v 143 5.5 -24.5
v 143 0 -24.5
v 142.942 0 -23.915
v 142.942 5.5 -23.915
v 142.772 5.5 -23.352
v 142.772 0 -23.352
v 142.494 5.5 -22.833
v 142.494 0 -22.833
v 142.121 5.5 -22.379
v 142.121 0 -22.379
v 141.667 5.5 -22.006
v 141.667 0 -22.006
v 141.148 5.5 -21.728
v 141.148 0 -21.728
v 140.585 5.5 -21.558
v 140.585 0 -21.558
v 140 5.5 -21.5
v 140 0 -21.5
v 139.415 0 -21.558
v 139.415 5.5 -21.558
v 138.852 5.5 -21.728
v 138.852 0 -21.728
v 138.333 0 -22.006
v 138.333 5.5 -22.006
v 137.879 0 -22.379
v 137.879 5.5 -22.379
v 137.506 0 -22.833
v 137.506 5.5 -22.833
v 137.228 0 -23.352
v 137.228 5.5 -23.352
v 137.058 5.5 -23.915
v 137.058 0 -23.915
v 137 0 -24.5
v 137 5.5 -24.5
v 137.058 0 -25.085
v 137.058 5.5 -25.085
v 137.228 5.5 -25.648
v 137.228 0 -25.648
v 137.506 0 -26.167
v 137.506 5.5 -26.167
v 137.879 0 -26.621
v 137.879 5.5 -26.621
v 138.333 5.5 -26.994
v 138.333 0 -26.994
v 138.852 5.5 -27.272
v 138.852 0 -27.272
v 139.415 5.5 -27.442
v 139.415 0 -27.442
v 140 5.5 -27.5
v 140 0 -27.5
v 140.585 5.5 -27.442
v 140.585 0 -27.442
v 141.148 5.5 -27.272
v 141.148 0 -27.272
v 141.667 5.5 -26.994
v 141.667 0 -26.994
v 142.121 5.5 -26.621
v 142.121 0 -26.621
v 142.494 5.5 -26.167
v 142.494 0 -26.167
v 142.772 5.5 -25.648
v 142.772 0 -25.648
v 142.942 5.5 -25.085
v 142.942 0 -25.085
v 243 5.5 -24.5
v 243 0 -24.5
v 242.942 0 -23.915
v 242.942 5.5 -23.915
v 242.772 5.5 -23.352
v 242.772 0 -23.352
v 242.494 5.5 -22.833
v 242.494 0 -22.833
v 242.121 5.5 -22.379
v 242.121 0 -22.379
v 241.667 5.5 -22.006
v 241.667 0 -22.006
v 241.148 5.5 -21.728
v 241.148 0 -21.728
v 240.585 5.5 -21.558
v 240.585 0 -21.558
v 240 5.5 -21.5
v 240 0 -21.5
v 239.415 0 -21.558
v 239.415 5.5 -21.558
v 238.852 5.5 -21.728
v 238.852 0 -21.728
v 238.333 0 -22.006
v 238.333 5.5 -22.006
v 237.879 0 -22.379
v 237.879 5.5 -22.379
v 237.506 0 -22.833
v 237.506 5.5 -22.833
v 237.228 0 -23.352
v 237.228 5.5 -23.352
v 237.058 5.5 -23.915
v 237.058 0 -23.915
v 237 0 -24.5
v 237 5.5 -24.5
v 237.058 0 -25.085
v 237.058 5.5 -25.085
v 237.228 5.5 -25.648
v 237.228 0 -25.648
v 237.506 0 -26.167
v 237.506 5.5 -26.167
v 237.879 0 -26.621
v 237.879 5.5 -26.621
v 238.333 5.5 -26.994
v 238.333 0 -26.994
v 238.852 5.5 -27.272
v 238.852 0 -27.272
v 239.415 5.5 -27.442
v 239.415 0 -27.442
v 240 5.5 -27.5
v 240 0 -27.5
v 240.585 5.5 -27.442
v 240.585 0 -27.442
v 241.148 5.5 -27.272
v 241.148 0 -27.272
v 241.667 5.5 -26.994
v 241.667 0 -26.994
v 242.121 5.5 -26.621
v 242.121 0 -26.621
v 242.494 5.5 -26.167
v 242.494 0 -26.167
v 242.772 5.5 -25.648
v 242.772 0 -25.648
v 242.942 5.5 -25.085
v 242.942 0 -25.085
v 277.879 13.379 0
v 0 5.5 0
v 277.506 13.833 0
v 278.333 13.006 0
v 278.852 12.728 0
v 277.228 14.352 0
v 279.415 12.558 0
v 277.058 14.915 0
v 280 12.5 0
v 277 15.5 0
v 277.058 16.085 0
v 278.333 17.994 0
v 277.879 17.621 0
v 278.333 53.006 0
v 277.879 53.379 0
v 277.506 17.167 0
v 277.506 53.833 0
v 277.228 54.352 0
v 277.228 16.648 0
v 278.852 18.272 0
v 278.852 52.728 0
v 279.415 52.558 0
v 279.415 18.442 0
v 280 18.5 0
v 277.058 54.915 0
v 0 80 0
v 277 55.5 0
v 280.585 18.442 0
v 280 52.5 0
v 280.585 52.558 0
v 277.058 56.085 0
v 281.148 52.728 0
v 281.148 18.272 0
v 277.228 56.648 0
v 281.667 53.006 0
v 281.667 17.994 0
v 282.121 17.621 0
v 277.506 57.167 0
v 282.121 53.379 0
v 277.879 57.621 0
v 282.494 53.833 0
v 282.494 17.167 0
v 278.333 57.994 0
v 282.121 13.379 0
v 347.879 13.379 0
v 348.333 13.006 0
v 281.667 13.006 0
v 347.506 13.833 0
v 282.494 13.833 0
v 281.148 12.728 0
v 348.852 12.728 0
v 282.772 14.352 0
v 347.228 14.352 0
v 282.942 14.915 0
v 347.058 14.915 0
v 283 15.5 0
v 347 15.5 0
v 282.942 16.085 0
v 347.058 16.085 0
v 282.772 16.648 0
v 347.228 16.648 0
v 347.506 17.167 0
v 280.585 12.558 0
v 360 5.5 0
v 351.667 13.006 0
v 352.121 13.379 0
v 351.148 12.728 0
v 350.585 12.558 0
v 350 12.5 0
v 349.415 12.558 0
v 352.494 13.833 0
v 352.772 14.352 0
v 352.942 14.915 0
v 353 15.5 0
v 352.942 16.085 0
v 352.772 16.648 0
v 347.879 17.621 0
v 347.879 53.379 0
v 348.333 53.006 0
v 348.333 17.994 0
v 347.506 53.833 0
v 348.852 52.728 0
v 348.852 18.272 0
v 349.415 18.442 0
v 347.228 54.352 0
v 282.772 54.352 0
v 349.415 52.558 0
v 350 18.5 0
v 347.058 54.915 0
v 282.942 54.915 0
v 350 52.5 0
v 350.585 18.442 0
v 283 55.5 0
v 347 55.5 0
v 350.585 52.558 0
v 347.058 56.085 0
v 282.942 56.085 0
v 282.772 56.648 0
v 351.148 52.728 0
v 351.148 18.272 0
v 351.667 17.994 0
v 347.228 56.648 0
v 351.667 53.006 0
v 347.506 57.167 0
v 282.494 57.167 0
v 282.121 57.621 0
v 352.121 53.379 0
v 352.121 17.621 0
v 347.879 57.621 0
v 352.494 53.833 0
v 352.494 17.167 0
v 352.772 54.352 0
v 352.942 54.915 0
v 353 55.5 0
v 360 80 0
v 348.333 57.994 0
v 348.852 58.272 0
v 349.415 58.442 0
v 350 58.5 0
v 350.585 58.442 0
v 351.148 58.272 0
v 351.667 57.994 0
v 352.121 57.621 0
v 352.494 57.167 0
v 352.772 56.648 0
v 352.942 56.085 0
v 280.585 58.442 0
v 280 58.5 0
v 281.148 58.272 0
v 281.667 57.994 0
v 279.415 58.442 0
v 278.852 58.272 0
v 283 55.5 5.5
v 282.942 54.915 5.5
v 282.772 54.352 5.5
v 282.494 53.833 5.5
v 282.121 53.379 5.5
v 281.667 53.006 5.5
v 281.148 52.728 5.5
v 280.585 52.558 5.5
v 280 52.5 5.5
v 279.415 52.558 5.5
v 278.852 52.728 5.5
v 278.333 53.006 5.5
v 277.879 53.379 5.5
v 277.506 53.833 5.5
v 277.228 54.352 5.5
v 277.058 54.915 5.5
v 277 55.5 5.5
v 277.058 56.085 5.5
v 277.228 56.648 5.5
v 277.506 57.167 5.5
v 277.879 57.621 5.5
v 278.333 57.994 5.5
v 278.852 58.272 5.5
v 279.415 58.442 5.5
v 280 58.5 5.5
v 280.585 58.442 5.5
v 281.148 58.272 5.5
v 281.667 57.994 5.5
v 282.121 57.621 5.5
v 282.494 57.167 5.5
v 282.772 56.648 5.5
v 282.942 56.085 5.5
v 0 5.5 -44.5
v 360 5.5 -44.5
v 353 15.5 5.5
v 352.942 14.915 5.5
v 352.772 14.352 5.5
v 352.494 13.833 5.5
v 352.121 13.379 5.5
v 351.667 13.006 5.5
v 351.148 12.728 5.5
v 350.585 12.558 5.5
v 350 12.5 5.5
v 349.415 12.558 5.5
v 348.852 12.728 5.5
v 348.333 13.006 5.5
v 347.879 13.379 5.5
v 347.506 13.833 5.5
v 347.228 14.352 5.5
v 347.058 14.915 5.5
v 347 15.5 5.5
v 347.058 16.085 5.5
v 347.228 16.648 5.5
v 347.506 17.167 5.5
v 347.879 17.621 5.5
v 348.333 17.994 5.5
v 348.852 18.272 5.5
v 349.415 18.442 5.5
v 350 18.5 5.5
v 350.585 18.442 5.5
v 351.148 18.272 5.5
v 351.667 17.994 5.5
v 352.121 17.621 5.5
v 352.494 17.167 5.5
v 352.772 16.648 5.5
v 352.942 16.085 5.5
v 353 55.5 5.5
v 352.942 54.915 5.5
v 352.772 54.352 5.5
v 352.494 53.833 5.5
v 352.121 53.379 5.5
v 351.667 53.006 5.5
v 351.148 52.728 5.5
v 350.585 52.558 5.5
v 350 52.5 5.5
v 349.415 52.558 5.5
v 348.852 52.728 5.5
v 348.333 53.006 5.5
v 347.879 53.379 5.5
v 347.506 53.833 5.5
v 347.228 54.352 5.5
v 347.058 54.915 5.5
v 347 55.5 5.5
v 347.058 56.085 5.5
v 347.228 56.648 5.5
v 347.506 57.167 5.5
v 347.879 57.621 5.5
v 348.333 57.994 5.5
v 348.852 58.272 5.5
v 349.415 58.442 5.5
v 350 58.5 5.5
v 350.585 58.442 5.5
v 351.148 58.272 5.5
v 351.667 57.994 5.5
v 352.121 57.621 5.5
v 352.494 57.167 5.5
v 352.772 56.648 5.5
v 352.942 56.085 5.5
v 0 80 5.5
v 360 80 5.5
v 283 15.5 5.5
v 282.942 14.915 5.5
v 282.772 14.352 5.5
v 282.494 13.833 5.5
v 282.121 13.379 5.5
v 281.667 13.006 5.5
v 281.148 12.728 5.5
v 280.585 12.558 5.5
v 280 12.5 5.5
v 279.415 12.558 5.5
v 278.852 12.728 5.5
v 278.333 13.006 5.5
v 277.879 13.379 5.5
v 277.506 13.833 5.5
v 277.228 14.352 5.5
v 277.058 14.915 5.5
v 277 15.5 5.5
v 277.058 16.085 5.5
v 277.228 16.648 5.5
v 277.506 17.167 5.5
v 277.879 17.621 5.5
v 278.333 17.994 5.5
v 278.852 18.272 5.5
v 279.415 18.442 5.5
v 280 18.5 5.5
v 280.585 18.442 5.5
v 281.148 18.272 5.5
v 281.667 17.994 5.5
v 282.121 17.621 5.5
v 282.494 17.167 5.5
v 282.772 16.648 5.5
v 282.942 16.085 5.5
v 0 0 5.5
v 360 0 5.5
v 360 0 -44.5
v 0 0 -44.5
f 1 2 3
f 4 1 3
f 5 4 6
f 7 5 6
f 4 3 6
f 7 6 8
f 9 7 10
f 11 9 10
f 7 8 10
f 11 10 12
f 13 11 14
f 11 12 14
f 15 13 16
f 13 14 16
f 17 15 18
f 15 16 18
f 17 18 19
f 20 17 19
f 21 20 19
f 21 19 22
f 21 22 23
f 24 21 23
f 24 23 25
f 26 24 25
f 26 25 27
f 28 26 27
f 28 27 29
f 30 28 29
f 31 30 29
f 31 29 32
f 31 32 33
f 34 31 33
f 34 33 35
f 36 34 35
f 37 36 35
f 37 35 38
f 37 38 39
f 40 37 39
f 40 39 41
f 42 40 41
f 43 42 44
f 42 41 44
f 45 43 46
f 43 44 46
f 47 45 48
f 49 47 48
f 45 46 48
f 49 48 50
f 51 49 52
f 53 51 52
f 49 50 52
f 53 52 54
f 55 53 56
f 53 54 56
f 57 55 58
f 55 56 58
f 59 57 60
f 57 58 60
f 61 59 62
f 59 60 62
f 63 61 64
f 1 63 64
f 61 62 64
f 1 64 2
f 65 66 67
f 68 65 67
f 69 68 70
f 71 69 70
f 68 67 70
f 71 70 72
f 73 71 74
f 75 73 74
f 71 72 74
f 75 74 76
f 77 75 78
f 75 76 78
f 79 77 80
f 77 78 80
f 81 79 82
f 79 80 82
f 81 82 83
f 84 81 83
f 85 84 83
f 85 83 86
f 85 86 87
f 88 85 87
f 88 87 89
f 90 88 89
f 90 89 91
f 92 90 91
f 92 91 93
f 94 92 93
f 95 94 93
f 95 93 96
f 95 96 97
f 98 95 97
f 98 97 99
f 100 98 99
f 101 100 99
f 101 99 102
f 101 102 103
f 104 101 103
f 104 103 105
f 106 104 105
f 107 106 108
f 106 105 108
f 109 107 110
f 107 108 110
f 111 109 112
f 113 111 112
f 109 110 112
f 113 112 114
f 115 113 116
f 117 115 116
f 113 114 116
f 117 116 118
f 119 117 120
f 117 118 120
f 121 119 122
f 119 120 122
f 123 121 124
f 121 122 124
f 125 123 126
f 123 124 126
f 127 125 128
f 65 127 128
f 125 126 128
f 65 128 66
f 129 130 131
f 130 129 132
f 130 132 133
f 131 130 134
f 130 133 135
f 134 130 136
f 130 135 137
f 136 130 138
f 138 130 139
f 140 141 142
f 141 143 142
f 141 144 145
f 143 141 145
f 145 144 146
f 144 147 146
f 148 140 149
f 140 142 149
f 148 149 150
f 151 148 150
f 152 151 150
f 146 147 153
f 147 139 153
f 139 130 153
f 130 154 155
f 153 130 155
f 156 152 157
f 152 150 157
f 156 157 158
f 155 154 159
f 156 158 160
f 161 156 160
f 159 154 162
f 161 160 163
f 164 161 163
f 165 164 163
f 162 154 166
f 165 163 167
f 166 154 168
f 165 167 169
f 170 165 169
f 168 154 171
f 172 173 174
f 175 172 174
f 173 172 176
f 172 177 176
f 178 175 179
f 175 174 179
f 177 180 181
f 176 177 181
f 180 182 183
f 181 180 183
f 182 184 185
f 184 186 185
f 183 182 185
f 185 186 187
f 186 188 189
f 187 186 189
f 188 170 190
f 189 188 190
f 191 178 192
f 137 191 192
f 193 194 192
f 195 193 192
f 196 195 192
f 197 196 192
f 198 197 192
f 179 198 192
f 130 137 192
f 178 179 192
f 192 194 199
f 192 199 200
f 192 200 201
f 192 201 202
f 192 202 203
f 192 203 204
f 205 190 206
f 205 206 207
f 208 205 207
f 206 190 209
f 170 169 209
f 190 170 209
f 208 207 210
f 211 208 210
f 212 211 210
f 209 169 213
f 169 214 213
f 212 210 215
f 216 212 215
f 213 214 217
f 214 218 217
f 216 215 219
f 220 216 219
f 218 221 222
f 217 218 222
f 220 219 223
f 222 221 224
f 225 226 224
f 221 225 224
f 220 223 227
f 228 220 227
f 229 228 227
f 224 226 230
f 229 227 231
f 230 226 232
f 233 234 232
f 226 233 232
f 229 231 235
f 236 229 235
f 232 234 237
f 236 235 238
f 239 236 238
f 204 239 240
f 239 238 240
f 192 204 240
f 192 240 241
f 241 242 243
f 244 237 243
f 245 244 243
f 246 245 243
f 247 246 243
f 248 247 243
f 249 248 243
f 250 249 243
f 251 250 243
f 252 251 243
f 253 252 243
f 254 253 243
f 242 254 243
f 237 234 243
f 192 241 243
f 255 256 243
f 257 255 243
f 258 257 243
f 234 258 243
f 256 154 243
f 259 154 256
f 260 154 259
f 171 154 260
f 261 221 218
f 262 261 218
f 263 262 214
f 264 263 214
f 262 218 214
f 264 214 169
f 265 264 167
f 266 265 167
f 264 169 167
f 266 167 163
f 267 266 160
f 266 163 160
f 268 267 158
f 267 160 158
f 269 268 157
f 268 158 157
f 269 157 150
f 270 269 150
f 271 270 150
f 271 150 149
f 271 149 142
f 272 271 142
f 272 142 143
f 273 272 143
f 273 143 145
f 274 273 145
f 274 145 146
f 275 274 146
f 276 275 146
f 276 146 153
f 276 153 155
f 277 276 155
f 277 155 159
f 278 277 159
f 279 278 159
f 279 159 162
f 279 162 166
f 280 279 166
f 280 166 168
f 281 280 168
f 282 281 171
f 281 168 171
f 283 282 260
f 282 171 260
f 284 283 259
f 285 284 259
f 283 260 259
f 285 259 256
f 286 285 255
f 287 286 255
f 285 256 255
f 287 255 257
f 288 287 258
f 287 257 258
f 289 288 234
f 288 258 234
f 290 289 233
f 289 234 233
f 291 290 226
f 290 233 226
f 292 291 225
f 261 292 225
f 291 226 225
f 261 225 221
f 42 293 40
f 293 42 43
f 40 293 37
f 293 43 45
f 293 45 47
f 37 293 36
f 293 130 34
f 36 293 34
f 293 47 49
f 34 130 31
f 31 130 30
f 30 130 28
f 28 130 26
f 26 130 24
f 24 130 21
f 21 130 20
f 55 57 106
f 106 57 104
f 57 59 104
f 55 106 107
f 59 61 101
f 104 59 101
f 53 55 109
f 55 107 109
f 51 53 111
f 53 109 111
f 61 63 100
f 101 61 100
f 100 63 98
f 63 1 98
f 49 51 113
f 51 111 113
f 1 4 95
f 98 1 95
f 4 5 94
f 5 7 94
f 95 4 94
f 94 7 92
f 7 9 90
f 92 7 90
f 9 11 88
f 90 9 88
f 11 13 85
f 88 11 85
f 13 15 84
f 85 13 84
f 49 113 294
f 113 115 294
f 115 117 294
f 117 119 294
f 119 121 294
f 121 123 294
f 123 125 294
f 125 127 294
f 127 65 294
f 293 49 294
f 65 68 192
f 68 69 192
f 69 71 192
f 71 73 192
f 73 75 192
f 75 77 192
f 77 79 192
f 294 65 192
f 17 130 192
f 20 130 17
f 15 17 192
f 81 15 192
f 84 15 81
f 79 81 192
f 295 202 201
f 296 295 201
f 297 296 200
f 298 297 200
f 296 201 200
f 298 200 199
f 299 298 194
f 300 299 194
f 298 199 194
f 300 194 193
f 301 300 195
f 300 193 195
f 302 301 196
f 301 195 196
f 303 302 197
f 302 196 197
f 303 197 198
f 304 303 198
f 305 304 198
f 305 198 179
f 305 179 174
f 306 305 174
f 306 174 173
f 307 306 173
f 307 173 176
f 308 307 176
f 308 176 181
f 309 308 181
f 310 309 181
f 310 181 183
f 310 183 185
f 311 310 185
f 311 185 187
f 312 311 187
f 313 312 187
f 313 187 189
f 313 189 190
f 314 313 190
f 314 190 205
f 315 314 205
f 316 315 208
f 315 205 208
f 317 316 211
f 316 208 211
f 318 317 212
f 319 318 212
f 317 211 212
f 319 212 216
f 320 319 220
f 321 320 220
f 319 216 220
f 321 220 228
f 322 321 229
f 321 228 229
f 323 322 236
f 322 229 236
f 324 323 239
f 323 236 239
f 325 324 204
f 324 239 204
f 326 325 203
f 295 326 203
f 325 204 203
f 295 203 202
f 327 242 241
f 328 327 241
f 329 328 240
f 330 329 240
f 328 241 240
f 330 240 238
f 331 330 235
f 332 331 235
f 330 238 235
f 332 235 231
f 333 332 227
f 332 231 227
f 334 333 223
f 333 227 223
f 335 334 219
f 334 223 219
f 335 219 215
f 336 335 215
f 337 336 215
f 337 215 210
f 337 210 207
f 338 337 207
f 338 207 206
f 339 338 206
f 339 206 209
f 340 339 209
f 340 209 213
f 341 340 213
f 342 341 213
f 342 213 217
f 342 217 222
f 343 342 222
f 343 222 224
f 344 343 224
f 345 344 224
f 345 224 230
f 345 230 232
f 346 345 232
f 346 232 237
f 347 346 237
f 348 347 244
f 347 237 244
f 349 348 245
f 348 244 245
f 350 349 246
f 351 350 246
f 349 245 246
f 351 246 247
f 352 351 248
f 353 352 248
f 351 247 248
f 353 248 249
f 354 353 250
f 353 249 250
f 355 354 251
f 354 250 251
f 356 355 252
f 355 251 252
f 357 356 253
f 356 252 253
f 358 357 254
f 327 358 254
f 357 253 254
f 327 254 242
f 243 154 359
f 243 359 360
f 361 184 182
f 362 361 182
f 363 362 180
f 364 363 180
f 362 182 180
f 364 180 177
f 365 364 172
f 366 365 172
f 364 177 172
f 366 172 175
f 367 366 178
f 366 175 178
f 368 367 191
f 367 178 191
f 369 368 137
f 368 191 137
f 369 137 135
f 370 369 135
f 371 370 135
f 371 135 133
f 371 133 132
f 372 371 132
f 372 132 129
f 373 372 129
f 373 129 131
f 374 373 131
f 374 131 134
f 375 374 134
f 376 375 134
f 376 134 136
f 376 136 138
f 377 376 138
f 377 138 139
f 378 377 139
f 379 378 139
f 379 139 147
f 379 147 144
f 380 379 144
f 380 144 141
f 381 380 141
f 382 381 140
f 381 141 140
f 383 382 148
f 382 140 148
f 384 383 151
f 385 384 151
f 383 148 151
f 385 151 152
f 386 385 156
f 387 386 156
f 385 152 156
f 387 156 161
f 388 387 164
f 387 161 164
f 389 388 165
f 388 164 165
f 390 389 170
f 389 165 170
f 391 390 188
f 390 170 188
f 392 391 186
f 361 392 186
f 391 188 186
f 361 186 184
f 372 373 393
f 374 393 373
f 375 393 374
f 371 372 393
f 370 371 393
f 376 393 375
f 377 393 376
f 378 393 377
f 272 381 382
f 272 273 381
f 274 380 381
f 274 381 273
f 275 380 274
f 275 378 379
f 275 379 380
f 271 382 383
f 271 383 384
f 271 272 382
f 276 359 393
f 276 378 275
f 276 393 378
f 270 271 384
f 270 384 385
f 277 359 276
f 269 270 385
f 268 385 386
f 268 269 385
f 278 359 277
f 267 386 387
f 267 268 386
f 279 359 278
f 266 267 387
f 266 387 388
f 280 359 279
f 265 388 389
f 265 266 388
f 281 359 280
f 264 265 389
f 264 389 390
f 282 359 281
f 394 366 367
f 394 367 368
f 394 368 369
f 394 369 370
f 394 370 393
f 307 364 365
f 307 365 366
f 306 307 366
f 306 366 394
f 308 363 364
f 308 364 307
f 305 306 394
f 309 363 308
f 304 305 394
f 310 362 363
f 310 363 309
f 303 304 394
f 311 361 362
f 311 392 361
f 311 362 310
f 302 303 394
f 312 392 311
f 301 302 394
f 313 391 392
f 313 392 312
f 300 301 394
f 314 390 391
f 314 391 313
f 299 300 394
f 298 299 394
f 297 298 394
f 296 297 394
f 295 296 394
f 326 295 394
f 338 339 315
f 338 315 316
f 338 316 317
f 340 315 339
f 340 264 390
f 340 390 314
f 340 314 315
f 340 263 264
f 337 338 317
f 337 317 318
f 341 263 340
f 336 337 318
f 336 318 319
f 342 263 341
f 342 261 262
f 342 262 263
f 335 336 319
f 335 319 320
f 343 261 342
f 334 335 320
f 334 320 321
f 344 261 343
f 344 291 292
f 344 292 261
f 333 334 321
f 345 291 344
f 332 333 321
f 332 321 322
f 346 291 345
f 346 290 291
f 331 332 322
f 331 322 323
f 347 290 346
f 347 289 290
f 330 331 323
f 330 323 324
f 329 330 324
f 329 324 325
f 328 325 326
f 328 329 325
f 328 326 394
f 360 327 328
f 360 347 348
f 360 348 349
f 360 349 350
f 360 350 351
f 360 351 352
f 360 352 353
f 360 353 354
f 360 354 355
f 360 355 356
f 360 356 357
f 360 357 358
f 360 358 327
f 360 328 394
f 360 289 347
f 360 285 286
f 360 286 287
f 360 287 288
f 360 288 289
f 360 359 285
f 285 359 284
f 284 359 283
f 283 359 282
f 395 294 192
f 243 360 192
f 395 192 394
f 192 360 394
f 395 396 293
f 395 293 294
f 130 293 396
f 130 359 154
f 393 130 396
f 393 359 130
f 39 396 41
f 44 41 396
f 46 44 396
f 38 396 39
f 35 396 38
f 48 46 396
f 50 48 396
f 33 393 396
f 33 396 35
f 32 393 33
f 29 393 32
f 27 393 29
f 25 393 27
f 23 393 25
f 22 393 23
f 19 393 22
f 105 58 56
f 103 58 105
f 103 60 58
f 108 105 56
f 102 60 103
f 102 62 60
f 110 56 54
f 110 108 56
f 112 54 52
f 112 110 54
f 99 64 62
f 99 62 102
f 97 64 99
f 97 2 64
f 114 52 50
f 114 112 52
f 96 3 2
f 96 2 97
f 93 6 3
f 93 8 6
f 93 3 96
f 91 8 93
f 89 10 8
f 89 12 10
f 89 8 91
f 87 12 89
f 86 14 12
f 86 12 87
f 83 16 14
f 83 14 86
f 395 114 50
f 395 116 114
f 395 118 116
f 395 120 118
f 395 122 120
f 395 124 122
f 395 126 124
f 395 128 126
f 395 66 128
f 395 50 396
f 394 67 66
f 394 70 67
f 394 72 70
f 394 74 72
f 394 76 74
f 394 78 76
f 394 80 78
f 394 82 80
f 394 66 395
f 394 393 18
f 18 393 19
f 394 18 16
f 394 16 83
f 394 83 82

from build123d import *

# Parameters (mm, degrees)
F0_W     = 360
F0_H     = 80
F1_DEPTH = 5.5
F2_W     = 360
F2_H     = 5.5
F3_DEPTH = 44.5
F4_R     = 3
F5_DEPTH = 25
F6_R     = 3
F7_DEPTH = 25


with BuildPart() as f1:
    # F0 (on Top) → F1 (new body)
    with BuildSketch(Plane.XY):
        with Locations((180, 40)):
            Rectangle(F0_W, F0_H)
    extrude(amount=F1_DEPTH)

    # F2 (on face) → F3 (join)
    with BuildSketch(Plane(origin=(0, 0, 0), x_dir=(1, 0, 0), z_dir=(0, 0, -1))):
        with Locations((180, -2.75)):
            Rectangle(F2_W, F2_H)
    extrude(amount=F3_DEPTH)

    # F4 (on face) → F5 (cut)
    with BuildSketch(Plane.XZ):
        with Locations((140, -24.5)):
            Circle(F4_R)
        with Locations((240, -24.5)):
            Circle(F4_R)
    extrude(amount=-F5_DEPTH, mode=Mode.SUBTRACT)

    # F6 (on face) → F7 (cut)
    with BuildSketch(Plane(origin=(0, 0, 0), x_dir=(1, 0, 0), z_dir=(0, 0, -1))):
        with Locations((280, -15.5)):
            Circle(F6_R)
        with Locations((280, -55.5)):
            Circle(F6_R)
        with Locations((350, -55.5)):
            Circle(F6_R)
        with Locations((350, -15.5)):
            Circle(F6_R)
    extrude(amount=-F7_DEPTH, mode=Mode.SUBTRACT)


solid = f1.part
